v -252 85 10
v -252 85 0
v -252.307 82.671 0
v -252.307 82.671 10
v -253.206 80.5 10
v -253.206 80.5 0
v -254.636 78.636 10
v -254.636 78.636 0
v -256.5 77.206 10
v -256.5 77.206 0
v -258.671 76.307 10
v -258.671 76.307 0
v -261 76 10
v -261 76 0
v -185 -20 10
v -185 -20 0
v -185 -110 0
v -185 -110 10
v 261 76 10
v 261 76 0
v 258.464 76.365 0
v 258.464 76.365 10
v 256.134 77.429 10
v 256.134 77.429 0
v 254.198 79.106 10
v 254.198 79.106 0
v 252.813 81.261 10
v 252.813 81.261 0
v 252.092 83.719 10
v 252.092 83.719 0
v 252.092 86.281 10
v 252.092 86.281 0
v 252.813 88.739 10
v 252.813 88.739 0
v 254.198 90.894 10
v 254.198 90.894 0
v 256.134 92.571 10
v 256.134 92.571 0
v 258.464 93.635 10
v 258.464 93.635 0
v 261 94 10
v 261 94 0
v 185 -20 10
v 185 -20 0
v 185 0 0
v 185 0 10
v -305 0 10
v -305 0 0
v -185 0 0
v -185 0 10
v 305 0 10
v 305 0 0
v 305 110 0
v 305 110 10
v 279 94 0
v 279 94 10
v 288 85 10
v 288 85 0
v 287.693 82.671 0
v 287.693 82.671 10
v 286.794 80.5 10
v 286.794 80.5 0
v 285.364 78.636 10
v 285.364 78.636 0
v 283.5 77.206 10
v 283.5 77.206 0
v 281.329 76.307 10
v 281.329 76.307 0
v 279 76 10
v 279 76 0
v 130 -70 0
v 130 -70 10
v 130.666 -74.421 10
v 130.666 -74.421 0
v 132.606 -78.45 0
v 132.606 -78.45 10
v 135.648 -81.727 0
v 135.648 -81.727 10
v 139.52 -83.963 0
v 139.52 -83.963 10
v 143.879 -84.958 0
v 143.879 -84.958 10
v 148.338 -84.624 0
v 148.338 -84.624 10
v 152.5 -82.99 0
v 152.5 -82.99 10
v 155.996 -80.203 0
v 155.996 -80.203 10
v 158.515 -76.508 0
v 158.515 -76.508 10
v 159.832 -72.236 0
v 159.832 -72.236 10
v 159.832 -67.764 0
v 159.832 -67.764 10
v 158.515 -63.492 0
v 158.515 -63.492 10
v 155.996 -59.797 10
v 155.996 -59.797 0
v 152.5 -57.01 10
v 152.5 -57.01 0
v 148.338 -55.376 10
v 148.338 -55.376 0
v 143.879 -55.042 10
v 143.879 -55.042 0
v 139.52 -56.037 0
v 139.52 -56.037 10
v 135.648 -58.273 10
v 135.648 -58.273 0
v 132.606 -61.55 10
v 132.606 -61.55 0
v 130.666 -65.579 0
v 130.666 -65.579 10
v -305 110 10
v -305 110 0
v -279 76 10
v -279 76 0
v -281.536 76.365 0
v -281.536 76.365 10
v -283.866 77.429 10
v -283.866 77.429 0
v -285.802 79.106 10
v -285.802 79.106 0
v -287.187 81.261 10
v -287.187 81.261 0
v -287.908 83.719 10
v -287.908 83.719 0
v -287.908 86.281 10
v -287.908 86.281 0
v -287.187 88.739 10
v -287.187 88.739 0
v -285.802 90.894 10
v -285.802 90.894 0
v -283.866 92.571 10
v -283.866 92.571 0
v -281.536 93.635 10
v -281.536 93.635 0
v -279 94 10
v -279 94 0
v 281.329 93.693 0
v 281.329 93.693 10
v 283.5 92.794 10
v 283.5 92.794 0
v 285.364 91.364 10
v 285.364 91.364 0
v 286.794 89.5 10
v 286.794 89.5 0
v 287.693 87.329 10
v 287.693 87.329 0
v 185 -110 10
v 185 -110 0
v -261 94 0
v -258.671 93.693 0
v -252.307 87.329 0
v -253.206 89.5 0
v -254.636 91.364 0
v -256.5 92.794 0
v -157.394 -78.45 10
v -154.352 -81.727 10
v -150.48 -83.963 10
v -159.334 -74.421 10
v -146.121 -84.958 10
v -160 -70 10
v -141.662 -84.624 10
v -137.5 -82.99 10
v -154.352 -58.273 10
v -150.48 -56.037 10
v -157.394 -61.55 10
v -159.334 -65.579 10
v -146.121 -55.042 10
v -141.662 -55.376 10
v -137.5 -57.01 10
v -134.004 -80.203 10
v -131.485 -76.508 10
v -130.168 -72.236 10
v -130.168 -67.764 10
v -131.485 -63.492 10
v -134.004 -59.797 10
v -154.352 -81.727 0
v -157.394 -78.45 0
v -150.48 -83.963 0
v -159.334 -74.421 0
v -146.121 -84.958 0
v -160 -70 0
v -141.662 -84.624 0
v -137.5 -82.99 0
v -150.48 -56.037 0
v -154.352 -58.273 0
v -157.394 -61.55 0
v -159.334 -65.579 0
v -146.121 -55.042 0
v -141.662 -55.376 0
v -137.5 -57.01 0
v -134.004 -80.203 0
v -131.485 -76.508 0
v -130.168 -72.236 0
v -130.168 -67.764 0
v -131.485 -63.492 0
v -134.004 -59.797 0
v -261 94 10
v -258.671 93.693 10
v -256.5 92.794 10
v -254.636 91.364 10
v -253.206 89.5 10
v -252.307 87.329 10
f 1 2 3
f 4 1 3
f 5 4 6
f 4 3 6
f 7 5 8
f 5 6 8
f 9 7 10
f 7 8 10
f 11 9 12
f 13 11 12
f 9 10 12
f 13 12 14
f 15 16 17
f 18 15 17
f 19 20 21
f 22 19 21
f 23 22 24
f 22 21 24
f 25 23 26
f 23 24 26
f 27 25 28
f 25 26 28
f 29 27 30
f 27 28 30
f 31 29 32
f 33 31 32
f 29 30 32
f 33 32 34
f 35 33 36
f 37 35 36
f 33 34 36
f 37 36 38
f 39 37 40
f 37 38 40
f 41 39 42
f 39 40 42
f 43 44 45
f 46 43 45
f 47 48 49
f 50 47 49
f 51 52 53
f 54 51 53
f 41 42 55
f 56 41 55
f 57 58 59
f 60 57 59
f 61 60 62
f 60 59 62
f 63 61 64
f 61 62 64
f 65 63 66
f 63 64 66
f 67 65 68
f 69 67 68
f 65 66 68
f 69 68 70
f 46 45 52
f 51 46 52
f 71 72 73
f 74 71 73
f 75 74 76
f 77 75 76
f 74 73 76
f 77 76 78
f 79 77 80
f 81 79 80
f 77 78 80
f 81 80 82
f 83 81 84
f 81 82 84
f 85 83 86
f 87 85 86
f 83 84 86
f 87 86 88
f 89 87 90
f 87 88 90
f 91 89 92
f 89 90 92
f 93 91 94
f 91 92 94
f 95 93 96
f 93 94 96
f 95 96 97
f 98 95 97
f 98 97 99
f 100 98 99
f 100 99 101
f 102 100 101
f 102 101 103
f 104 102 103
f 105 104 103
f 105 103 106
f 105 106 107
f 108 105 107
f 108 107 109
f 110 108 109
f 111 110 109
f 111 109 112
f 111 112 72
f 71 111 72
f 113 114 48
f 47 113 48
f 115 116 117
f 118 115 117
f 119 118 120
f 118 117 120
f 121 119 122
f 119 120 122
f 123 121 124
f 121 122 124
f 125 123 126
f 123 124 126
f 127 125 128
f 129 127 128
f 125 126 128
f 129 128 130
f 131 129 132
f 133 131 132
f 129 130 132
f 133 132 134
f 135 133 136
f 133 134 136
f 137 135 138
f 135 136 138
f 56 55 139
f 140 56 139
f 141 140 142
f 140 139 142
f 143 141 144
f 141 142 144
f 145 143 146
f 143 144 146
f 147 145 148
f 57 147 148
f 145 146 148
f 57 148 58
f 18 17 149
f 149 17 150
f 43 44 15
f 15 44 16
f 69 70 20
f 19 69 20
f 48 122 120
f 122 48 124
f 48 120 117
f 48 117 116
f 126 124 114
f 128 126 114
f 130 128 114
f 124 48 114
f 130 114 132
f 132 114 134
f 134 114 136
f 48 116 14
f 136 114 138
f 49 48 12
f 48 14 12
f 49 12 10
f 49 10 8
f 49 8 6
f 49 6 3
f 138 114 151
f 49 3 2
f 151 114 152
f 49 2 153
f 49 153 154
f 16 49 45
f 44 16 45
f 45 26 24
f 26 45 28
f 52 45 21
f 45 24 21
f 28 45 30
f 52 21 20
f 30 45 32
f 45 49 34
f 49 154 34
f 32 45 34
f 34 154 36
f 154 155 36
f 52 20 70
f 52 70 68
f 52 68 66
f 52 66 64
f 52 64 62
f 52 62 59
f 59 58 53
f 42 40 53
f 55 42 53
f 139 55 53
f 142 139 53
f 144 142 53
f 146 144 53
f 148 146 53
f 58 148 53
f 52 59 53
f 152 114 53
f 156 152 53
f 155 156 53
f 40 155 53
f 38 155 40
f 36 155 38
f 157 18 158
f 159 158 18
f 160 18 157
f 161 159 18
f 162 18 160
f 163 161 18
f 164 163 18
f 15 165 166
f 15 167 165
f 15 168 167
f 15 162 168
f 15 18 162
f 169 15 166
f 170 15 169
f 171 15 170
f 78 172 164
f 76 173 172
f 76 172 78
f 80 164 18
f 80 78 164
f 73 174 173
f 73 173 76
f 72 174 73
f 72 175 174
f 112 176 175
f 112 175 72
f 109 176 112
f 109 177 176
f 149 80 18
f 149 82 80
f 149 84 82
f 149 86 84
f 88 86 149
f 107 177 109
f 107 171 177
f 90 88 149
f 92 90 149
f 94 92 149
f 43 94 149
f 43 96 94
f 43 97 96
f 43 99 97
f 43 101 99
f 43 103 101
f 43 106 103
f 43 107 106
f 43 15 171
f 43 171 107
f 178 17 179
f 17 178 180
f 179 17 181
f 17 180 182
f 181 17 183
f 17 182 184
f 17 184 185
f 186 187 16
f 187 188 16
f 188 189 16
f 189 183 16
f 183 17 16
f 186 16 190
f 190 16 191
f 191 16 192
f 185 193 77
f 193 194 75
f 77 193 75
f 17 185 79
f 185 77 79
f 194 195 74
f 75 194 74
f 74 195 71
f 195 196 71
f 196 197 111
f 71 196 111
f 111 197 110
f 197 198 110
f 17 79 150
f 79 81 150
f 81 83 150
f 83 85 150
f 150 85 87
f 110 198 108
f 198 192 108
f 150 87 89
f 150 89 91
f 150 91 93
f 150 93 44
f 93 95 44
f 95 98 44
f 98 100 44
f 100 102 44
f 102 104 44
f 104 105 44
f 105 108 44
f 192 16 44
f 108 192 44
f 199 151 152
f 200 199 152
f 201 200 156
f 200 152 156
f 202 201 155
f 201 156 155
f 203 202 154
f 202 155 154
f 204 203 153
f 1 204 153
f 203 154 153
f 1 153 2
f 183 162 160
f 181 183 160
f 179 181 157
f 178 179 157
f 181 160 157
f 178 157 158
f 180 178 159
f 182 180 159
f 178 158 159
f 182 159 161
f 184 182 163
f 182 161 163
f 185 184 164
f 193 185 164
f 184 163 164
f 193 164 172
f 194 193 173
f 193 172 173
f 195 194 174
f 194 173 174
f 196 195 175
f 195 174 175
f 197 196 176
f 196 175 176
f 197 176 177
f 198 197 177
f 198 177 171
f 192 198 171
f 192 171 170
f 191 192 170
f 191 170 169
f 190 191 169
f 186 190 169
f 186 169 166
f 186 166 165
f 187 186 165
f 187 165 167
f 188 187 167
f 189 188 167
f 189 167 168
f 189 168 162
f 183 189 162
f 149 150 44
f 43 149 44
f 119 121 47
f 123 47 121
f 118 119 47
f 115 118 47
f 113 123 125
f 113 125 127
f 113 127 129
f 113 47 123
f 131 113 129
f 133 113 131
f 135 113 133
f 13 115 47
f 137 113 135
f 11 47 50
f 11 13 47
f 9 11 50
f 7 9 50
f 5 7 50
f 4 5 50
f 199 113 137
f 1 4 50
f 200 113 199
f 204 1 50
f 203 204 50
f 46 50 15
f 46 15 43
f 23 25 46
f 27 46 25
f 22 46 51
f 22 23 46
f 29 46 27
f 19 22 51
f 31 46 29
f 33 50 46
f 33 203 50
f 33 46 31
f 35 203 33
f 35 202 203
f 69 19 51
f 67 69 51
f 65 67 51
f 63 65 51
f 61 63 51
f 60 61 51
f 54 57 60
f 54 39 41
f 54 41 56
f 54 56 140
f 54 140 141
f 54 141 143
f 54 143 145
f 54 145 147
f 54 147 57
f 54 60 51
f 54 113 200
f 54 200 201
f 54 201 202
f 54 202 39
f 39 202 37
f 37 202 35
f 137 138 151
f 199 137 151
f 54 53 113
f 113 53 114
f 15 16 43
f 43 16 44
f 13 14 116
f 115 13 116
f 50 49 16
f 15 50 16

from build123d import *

# Parameters (mm, degrees)
F1_DEPTH = 10
F2_DEPTH = 10
F3_D     = 30


with BuildPart() as f1:
    # F0 (on Top) → F1 (new body)
    with BuildSketch(Plane.XY):
        Polygon((-185, 0), (0, 0), (185, 0), (305, 0), (305, 110), (0, 110), (-305, 110), (-305, 0), align=None)
        with BuildLine():
            Line((-279, 94), (-261, 94))
            ThreePointArc((-261, 94), (-254.6360389693, 91.3639610307), (-252, 85))
            ThreePointArc((-252, 85), (-254.6360389693, 78.6360389693), (-261, 76))
            Line((-261, 76), (-279, 76))
            ThreePointArc((-279, 76), (-288, 85), (-279, 94))
        make_face(mode=Mode.SUBTRACT)
        with BuildLine():
            Line((279, 76), (261, 76))
            ThreePointArc((261, 76), (252, 85), (261, 94))
            Line((261, 94), (279, 94))
            ThreePointArc((279, 94), (285.3639610307, 91.3639610307), (288, 85))
            ThreePointArc((288, 85), (285.3639610307, 78.6360389693), (279, 76))
        make_face(mode=Mode.SUBTRACT)
        Polygon((185, 0), (0, 0), (-185, 0), (-185, -20), (0, -20), (185, -20), align=None)
    extrude(amount=F1_DEPTH)


with BuildPart() as f2:
    # F0 (on Top) → F2 (new body)
    with BuildSketch(Plane.XY):
        Polygon((0, -20), (-185, -20), (-185, -110), (0, -110), (185, -110), (185, -20), align=None)
    extrude(amount=F2_DEPTH)

    # F3 (through all)
    with Locations(Plane(origin=(0, 0, 0), x_dir=(1, 0, 0), z_dir=(0, 0, -1))):
        with Locations((-145, 70), (145, 70)):
            Hole(F3_D / 2)


solid = Compound([f1.part, f2.part])
